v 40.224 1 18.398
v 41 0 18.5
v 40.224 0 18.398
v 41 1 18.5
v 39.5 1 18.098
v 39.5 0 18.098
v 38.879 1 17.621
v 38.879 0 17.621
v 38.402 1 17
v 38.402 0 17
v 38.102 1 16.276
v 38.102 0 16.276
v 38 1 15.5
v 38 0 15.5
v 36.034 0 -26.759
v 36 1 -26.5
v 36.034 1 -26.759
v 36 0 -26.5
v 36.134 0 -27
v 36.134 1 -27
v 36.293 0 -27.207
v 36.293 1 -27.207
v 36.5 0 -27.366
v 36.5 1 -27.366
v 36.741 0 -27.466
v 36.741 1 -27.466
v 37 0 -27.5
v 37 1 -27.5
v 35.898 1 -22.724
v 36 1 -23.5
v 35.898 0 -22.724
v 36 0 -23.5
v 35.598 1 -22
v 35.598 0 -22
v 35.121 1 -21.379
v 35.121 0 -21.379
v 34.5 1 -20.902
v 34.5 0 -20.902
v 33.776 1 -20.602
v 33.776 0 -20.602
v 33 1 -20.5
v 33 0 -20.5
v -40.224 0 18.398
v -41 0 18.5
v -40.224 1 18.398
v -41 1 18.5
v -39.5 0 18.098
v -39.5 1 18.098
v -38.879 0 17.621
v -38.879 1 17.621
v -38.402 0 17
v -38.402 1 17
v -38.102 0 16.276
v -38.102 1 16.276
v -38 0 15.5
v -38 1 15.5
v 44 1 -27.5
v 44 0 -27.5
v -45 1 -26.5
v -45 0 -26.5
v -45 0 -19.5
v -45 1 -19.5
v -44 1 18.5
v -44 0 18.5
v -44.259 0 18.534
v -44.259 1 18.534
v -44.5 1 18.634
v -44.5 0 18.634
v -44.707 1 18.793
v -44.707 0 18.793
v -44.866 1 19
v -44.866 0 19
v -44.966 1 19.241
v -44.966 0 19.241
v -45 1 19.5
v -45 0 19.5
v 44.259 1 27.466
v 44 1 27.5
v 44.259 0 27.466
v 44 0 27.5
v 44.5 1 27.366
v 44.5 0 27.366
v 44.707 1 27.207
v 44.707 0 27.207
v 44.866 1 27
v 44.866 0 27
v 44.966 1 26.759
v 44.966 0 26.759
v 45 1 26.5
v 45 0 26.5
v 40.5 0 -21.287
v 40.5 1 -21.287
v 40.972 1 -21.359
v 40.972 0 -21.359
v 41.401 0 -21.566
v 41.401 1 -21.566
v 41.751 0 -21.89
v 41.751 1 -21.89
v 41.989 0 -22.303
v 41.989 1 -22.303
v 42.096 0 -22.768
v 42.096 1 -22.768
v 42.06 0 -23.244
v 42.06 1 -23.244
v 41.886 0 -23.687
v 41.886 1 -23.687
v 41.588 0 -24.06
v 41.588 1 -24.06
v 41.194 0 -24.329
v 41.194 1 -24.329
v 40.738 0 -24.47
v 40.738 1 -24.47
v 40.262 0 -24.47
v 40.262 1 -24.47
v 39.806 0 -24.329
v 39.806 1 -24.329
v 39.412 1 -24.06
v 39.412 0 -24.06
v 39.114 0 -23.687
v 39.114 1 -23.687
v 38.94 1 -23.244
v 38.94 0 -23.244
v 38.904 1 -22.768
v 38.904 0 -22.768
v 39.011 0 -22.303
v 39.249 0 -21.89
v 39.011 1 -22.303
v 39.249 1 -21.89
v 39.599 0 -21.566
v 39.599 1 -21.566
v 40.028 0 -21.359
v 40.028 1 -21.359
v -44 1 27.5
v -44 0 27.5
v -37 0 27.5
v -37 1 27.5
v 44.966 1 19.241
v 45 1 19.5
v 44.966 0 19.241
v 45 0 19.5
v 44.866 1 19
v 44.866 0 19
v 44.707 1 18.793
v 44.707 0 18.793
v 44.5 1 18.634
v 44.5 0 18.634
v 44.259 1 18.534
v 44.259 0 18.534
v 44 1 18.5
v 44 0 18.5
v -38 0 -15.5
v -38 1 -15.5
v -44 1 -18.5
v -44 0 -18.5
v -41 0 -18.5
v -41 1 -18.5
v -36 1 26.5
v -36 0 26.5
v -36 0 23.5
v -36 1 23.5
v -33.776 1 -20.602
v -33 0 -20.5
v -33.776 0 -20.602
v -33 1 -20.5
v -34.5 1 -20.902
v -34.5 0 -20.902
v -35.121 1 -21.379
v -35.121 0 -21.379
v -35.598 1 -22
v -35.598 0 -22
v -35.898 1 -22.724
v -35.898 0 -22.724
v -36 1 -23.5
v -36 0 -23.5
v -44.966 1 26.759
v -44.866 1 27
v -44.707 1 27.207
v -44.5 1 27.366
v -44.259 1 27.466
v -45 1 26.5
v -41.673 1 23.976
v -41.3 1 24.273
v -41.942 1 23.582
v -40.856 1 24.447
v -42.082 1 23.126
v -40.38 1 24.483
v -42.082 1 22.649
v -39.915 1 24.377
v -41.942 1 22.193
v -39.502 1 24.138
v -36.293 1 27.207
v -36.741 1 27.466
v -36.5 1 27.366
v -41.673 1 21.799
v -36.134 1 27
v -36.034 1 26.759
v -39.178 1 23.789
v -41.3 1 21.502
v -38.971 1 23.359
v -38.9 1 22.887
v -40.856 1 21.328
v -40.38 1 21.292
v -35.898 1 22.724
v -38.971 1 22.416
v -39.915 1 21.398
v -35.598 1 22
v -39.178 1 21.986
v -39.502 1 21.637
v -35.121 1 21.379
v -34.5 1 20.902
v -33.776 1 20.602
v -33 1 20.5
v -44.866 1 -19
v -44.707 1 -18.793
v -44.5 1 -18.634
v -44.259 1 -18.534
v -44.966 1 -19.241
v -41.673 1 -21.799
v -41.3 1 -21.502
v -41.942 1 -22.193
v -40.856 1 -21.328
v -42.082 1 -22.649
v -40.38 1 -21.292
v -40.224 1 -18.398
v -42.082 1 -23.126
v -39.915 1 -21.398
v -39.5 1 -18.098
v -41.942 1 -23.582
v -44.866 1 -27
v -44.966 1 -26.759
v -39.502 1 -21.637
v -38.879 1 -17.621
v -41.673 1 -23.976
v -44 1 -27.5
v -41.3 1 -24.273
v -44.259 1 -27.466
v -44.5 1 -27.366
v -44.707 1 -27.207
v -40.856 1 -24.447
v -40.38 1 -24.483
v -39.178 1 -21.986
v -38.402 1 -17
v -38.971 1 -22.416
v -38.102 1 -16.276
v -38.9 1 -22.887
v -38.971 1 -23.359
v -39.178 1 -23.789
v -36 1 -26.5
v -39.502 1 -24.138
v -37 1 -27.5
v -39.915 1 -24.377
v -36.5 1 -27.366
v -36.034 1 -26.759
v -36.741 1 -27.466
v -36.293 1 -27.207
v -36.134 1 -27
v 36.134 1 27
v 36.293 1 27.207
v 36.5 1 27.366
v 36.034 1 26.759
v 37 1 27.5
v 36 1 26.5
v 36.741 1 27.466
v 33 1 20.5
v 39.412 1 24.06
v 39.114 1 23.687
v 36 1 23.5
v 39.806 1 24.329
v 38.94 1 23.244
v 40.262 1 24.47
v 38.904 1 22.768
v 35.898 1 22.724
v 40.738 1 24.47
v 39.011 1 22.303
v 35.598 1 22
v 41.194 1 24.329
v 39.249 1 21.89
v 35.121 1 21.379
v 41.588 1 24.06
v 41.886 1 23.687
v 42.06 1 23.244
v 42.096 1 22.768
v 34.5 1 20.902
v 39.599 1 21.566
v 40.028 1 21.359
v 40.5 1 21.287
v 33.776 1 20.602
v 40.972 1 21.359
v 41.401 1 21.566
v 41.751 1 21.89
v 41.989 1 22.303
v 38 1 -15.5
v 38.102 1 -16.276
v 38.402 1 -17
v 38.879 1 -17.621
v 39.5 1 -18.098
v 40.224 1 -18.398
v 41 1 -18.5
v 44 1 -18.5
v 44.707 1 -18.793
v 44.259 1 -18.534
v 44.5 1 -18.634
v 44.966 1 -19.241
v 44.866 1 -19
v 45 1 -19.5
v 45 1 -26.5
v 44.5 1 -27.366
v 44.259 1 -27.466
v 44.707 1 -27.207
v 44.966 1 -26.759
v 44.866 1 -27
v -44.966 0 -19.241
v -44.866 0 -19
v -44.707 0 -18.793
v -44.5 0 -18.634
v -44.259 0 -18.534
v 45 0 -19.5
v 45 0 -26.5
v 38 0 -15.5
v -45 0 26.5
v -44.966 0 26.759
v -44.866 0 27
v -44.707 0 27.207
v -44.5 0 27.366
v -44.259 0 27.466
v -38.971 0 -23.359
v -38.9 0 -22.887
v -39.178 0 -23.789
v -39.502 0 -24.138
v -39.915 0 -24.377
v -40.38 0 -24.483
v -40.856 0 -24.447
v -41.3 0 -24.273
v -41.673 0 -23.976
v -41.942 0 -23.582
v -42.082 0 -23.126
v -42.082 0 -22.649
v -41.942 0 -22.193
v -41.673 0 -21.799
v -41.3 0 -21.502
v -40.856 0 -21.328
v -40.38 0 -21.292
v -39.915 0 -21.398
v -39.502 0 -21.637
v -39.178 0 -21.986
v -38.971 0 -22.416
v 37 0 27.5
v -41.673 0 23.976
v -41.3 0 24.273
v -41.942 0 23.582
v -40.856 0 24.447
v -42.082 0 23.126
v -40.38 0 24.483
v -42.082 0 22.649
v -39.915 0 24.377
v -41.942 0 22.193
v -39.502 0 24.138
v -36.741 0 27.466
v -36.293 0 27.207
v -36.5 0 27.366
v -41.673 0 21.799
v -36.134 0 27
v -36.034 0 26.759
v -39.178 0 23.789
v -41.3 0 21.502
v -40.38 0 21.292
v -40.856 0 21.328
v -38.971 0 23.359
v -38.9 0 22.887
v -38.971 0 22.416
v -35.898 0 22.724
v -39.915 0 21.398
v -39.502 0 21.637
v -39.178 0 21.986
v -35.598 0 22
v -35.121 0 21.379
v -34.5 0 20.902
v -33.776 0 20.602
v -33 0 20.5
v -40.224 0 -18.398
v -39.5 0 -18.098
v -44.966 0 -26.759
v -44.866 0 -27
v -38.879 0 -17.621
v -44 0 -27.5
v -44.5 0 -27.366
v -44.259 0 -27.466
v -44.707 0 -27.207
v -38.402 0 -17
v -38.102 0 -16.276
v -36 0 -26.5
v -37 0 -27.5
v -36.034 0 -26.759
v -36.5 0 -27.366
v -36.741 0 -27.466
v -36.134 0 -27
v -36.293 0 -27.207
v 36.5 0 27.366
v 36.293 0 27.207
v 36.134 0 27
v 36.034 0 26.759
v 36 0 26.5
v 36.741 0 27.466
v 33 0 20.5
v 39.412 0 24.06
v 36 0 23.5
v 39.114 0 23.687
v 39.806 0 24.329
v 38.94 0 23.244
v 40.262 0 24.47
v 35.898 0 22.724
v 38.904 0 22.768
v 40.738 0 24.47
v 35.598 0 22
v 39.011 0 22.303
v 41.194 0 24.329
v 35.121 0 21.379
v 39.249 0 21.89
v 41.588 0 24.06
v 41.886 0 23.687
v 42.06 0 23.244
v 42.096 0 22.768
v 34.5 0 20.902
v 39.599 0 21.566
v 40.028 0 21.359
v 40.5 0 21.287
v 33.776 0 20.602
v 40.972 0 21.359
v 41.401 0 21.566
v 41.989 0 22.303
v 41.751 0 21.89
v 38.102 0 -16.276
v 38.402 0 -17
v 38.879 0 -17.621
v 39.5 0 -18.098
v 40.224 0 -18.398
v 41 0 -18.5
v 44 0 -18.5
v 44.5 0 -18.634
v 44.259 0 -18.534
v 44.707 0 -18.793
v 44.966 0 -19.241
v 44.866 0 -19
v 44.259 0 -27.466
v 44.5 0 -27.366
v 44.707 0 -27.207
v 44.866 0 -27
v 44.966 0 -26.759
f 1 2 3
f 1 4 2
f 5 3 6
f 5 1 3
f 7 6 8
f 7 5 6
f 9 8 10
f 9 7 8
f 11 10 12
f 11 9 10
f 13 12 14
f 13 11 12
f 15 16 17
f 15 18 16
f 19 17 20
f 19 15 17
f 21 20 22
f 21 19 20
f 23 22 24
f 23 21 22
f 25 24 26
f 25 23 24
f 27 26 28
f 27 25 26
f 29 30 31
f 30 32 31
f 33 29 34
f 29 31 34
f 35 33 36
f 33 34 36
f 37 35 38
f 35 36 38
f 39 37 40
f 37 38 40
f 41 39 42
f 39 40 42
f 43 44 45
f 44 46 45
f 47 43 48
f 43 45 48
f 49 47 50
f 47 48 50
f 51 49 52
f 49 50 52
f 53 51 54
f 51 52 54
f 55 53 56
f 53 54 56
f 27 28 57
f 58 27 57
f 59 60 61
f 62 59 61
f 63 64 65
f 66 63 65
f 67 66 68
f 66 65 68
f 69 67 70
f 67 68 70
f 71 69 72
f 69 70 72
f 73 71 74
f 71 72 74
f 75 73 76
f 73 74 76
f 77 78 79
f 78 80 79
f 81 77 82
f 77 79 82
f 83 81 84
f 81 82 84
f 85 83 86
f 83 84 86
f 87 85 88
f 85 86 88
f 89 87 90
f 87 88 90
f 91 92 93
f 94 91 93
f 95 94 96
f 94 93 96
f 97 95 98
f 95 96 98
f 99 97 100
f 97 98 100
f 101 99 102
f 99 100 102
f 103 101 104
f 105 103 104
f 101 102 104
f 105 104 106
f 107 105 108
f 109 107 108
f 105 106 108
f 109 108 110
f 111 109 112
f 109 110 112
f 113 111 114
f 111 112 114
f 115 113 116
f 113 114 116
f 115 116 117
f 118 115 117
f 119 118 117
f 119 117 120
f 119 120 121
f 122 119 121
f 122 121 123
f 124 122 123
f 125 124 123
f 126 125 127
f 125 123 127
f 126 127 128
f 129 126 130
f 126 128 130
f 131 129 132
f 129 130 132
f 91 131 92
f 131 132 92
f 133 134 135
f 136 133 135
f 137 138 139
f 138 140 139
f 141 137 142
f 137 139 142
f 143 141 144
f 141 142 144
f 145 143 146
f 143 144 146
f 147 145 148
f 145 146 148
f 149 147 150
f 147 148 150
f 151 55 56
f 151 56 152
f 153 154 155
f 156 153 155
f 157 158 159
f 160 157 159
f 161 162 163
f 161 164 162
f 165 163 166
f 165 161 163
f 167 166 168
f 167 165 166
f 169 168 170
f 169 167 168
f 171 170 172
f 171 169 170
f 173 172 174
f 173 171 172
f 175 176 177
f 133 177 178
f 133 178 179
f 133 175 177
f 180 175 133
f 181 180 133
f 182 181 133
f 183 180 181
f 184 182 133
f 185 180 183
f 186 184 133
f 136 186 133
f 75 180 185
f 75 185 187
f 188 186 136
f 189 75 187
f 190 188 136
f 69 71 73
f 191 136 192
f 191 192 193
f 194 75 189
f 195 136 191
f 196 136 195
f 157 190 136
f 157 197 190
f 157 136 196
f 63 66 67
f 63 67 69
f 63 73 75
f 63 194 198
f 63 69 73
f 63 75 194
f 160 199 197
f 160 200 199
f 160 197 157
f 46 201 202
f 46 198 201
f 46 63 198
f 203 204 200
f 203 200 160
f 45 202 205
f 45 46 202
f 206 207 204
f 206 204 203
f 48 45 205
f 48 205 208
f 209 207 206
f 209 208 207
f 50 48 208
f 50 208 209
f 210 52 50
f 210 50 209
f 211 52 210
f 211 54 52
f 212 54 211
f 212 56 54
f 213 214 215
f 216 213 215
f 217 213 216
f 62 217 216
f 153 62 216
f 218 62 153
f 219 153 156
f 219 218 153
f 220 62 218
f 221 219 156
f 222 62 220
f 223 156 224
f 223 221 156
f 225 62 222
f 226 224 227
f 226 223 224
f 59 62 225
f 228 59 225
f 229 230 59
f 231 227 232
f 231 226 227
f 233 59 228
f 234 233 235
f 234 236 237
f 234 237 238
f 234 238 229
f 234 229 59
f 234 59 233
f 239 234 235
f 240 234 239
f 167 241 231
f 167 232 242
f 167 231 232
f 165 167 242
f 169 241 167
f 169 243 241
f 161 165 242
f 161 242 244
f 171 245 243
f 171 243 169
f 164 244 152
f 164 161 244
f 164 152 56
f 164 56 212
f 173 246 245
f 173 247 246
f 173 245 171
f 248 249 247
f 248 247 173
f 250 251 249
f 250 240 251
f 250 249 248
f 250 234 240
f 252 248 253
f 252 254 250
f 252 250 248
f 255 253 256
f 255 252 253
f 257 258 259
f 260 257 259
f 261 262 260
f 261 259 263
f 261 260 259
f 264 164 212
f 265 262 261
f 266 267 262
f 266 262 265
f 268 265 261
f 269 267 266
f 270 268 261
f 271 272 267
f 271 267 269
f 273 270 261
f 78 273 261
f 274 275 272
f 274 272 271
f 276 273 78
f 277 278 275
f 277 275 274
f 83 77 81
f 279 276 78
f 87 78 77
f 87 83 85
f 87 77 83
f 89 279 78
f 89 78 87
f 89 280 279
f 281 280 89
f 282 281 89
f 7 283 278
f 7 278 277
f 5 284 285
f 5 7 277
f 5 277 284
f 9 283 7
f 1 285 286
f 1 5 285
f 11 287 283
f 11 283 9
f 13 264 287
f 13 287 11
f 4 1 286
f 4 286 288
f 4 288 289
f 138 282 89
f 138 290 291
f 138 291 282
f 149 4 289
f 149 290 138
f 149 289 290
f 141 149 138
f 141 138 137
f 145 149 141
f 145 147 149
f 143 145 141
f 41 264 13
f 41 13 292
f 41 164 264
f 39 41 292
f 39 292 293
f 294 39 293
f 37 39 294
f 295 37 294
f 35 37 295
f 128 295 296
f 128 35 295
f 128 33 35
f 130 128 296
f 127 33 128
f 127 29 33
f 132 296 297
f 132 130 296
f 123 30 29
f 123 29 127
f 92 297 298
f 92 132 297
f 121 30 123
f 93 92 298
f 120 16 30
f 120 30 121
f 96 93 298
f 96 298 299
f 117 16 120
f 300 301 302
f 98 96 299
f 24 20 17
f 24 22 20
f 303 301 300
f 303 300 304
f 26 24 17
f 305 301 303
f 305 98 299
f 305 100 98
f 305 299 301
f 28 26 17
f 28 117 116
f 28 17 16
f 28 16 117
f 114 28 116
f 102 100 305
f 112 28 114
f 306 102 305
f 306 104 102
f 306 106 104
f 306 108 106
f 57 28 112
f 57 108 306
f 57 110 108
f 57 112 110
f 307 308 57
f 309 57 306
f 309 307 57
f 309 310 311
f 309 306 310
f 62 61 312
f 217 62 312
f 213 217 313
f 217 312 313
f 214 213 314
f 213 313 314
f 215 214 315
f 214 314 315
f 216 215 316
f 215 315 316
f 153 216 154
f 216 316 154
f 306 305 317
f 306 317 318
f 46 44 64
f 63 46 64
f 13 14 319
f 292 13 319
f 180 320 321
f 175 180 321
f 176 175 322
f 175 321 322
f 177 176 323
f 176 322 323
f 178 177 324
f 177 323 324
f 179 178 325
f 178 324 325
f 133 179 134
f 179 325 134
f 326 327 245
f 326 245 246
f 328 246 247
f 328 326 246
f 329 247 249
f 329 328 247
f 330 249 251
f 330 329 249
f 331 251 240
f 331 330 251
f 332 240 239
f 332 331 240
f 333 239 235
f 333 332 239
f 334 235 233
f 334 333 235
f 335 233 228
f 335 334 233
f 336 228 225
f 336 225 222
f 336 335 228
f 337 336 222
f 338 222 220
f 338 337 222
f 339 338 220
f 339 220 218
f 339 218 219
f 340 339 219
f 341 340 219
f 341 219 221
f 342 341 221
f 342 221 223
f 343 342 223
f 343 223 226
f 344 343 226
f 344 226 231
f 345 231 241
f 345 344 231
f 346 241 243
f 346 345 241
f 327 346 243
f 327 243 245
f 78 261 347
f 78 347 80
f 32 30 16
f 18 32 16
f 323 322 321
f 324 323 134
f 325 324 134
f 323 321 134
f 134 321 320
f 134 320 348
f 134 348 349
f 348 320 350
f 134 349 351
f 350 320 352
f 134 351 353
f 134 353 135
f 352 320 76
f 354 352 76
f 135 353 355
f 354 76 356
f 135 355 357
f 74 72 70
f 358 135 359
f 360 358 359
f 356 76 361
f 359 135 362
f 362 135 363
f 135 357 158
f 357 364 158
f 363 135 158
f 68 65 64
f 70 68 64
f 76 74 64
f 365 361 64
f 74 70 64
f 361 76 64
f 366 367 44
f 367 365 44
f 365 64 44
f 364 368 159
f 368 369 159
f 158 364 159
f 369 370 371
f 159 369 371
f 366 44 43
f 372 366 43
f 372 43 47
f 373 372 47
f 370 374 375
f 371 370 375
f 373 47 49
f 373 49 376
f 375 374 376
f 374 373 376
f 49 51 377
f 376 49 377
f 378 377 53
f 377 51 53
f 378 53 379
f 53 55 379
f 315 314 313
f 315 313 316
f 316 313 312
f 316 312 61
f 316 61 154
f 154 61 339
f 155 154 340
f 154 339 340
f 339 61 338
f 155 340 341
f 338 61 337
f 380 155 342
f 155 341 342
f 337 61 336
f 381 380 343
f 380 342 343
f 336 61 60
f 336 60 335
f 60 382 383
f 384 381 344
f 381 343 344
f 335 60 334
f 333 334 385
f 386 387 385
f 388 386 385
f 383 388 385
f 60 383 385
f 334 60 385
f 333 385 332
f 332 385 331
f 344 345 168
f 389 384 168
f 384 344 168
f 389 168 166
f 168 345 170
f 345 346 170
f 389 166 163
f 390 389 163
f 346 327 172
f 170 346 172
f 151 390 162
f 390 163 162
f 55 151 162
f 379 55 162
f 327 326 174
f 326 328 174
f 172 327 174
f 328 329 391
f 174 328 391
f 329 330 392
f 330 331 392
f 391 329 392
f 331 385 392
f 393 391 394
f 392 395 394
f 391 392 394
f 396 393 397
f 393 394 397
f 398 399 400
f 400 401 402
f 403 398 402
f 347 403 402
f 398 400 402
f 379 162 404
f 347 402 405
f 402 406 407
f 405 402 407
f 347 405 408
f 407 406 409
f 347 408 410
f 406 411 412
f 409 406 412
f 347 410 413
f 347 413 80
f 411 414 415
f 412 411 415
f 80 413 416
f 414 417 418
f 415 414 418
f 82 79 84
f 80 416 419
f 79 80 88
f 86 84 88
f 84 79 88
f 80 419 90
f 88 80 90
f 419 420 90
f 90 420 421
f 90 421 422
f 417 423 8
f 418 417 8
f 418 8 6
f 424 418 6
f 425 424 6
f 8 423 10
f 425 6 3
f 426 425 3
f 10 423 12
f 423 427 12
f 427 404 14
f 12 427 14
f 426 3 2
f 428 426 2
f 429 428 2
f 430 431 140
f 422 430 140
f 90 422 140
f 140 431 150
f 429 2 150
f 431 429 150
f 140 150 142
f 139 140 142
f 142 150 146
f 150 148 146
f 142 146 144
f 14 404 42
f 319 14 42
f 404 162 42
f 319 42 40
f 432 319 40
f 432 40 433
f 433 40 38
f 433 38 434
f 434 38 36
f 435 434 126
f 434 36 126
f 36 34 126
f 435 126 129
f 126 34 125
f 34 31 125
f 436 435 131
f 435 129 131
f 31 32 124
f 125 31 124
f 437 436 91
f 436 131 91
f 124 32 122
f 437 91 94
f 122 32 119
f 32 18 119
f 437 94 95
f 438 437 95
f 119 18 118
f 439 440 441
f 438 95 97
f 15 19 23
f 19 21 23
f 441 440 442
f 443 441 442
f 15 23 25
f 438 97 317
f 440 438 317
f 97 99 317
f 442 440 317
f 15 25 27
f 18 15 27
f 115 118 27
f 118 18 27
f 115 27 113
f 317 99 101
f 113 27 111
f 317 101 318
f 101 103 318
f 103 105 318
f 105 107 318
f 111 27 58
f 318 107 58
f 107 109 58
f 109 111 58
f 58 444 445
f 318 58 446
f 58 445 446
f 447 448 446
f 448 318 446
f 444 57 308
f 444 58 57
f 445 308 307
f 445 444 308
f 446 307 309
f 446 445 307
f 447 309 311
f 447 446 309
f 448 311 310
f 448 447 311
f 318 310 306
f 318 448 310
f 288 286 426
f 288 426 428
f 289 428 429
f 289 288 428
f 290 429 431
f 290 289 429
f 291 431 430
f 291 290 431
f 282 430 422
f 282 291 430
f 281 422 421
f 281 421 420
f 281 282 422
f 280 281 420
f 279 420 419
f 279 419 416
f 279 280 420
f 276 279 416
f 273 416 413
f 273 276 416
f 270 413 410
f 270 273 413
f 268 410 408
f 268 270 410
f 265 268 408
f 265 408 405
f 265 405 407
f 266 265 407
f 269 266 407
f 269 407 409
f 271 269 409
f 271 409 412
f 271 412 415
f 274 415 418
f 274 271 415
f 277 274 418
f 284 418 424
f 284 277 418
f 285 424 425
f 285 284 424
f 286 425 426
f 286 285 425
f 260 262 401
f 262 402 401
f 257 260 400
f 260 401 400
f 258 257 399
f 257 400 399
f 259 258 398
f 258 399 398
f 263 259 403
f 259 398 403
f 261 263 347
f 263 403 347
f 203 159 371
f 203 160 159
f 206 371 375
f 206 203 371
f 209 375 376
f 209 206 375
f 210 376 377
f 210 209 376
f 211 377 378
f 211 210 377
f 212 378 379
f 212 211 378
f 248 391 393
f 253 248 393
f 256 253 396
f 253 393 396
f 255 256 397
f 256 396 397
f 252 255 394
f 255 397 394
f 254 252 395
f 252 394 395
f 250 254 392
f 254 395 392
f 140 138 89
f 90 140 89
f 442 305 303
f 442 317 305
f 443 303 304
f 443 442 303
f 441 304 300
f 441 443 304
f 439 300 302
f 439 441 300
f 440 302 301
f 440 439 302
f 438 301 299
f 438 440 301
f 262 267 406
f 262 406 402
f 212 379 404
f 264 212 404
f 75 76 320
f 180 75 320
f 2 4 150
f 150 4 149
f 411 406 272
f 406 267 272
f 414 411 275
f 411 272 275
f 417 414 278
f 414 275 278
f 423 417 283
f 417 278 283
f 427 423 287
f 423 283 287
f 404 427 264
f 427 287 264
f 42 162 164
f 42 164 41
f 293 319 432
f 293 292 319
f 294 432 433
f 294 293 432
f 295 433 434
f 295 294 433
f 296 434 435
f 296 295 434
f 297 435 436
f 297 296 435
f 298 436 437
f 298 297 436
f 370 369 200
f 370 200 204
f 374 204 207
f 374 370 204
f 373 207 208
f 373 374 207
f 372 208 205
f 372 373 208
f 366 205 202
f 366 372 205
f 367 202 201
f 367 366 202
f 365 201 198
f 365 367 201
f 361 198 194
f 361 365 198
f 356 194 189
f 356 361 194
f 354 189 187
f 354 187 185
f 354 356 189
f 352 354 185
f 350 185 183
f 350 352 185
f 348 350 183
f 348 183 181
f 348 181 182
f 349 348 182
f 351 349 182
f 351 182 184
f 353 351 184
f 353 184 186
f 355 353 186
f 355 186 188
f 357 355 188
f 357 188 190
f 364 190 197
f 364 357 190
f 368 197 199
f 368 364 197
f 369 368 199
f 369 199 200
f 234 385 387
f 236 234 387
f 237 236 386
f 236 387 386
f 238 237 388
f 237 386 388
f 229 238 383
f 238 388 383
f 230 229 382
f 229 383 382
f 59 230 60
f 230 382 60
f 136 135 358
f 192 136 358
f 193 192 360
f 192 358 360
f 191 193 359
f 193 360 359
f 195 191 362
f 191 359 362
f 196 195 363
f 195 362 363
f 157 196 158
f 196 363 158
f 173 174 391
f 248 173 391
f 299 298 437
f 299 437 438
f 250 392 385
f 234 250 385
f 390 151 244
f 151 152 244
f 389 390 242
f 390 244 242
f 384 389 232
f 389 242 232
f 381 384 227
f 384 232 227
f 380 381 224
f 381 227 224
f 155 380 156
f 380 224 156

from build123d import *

# Parameters (mm, degrees)
SKETCH1_W            = 76
SKETCH1_H            = 41
BOSS_EXTRUDE1_DEPTH  = 1
SKETCH2_W            = 9
SKETCH2_H            = 9
BOSS_EXTRUDE2_DEPTH  = 1
SKETCH3_R            = 1.6
CUT_EXTRUDE1_DEPTH   = 1
FILLET1_R            = 1
FILLET3_R            = 3
FILLET1_OF_MIRROR2_R = 1
MIRROR3_OUTLINE_R    = 1.6
MIRROR3_DEPTH        = 1
FILLET4_R            = 3


# Read off the part's stored shape, not the designer's step: Mirror3
with BuildPart() as part:
    # Sketch1 → Boss-Extrude1 (new body)
    with BuildSketch(Plane(origin=(0, 0, 0), x_dir=(1, 0, 0), z_dir=(0, 1, 0))):
        Rectangle(SKETCH1_W, SKETCH1_H)
    boss_extrude1 = extrude(amount=BOSS_EXTRUDE1_DEPTH)

    # Sketch2 → Boss-Extrude2 (add)
    with BuildSketch(Plane(origin=(0, 1, 0), x_dir=(1, 0, 0), z_dir=(0, 1, 0))):
        with Locations((40.5, 23)):
            Rectangle(SKETCH2_W, SKETCH2_H)
    boss_extrude2 = extrude(amount=-BOSS_EXTRUDE2_DEPTH)

    # Sketch3 → Cut-Extrude1 (cut)
    with BuildSketch(Plane(origin=(0, 1, 0), x_dir=(1, 0, 0), z_dir=(0, 1, 0))):
        with Locations(Location((40.5, 22.887482194, 0), (0, 0, 270))):
            Circle(SKETCH3_R)
    cut_extrude1 = extrude(amount=-CUT_EXTRUDE1_DEPTH, mode=Mode.SUBTRACT)

    # Fillet1
    fillet1_edges = [part.edges().sort_by_distance(p)[0] for p in [
        (45, 0.5, -18.5),
        (36, 0.5, -27.5),
        (45, 0.5, -27.5),
    ]]
    fillet(fillet1_edges, radius=FILLET1_R)

    # Fillet3
    fillet3_edges = [part.edges().sort_by_distance(p)[0] for p in [
        (36, 0.5, -20.5),
        (38, 0.5, -18.5),
    ]]
    fillet(fillet3_edges, radius=FILLET3_R)

    # Mirror2: Boss-Extrude1, Boss-Extrude2, Cut-Extrude1 across plane
    add(boss_extrude1.mirror(Plane.XY))
    add(boss_extrude2.mirror(Plane.XY))
    add(cut_extrude1.mirror(Plane.XY), mode=Mode.SUBTRACT)

    # Fillet1 of Mirror2
    fillet1_of_mirror2_edges = [part.edges().sort_by_distance(p)[0] for p in [
        (45, 0.5, 18.5),
        (36, 0.5, 27.5),
        (45, 0.5, 27.5),
    ]]
    fillet(fillet1_of_mirror2_edges, radius=FILLET1_OF_MIRROR2_R)

    # Mirror3 outline → Mirror3 (add)
    # profile 1 of 2: a face of its own
    with BuildSketch(Plane(origin=(0, 0, 0), x_dir=(1, 0, 0), z_dir=(0, 1, 0))):
        with BuildLine():
            Line((-38, -20.5), (-38, -18.5))
            Line((-38, -18.5), (-44, -18.5))
            ThreePointArc((-44, -18.5), (-44.707106781, -18.792893219), (-45, -19.5))
            Line((-45, -19.5), (-45, -26.5))
            ThreePointArc((-45, -26.5), (-44.707106781, -27.207106781), (-44, -27.5))
            Line((-44, -27.5), (-37, -27.5))
            ThreePointArc((-37, -27.5), (-36.292893219, -27.207106781), (-36, -26.5))
            Line((-36, -26.5), (-36, -20.5))
            Line((-36, -20.5), (-38, -20.5))
        make_face()
        with Locations((-40.5, -22.887482194)):
            Circle(MIRROR3_OUTLINE_R, mode=Mode.SUBTRACT)
    # profile 2 of 2: a face of its own
    with BuildSketch(Plane(origin=(0, 0, 0), x_dir=(1, 0, 0), z_dir=(0, 1, 0))):
        with BuildLine():
            Line((-44, 18.5), (-38, 18.5))
            Line((-38, 18.5), (-38, 20.5))
            Line((-38, 20.5), (-36, 20.5))
            Line((-36, 20.5), (-36, 26.5))
            ThreePointArc((-36, 26.5), (-36.292893219, 27.207106781), (-37, 27.5))
            Line((-37, 27.5), (-44, 27.5))
            ThreePointArc((-44, 27.5), (-44.707106781, 27.207106781), (-45, 26.5))
            Line((-45, 26.5), (-45, 19.5))
            ThreePointArc((-45, 19.5), (-44.707106781, 18.792893219), (-44, 18.5))
        make_face()
        with Locations((-40.5, 22.887482194)):
            Circle(MIRROR3_OUTLINE_R, mode=Mode.SUBTRACT)
    extrude(amount=MIRROR3_DEPTH)

    # Fillet4
    fillet4_edges = [part.edges().sort_by_distance(p)[0] for p in [
        (-36, 0.5, 20.5),
        (-38, 0.5, 18.5),
        (-36, 0.5, -20.5),
        (-38, 0.5, -18.5),
        (36, 0.5, 20.5),
        (38, 0.5, 18.5),
    ]]
    fillet(fillet4_edges, radius=FILLET4_R)


solid = part.part
